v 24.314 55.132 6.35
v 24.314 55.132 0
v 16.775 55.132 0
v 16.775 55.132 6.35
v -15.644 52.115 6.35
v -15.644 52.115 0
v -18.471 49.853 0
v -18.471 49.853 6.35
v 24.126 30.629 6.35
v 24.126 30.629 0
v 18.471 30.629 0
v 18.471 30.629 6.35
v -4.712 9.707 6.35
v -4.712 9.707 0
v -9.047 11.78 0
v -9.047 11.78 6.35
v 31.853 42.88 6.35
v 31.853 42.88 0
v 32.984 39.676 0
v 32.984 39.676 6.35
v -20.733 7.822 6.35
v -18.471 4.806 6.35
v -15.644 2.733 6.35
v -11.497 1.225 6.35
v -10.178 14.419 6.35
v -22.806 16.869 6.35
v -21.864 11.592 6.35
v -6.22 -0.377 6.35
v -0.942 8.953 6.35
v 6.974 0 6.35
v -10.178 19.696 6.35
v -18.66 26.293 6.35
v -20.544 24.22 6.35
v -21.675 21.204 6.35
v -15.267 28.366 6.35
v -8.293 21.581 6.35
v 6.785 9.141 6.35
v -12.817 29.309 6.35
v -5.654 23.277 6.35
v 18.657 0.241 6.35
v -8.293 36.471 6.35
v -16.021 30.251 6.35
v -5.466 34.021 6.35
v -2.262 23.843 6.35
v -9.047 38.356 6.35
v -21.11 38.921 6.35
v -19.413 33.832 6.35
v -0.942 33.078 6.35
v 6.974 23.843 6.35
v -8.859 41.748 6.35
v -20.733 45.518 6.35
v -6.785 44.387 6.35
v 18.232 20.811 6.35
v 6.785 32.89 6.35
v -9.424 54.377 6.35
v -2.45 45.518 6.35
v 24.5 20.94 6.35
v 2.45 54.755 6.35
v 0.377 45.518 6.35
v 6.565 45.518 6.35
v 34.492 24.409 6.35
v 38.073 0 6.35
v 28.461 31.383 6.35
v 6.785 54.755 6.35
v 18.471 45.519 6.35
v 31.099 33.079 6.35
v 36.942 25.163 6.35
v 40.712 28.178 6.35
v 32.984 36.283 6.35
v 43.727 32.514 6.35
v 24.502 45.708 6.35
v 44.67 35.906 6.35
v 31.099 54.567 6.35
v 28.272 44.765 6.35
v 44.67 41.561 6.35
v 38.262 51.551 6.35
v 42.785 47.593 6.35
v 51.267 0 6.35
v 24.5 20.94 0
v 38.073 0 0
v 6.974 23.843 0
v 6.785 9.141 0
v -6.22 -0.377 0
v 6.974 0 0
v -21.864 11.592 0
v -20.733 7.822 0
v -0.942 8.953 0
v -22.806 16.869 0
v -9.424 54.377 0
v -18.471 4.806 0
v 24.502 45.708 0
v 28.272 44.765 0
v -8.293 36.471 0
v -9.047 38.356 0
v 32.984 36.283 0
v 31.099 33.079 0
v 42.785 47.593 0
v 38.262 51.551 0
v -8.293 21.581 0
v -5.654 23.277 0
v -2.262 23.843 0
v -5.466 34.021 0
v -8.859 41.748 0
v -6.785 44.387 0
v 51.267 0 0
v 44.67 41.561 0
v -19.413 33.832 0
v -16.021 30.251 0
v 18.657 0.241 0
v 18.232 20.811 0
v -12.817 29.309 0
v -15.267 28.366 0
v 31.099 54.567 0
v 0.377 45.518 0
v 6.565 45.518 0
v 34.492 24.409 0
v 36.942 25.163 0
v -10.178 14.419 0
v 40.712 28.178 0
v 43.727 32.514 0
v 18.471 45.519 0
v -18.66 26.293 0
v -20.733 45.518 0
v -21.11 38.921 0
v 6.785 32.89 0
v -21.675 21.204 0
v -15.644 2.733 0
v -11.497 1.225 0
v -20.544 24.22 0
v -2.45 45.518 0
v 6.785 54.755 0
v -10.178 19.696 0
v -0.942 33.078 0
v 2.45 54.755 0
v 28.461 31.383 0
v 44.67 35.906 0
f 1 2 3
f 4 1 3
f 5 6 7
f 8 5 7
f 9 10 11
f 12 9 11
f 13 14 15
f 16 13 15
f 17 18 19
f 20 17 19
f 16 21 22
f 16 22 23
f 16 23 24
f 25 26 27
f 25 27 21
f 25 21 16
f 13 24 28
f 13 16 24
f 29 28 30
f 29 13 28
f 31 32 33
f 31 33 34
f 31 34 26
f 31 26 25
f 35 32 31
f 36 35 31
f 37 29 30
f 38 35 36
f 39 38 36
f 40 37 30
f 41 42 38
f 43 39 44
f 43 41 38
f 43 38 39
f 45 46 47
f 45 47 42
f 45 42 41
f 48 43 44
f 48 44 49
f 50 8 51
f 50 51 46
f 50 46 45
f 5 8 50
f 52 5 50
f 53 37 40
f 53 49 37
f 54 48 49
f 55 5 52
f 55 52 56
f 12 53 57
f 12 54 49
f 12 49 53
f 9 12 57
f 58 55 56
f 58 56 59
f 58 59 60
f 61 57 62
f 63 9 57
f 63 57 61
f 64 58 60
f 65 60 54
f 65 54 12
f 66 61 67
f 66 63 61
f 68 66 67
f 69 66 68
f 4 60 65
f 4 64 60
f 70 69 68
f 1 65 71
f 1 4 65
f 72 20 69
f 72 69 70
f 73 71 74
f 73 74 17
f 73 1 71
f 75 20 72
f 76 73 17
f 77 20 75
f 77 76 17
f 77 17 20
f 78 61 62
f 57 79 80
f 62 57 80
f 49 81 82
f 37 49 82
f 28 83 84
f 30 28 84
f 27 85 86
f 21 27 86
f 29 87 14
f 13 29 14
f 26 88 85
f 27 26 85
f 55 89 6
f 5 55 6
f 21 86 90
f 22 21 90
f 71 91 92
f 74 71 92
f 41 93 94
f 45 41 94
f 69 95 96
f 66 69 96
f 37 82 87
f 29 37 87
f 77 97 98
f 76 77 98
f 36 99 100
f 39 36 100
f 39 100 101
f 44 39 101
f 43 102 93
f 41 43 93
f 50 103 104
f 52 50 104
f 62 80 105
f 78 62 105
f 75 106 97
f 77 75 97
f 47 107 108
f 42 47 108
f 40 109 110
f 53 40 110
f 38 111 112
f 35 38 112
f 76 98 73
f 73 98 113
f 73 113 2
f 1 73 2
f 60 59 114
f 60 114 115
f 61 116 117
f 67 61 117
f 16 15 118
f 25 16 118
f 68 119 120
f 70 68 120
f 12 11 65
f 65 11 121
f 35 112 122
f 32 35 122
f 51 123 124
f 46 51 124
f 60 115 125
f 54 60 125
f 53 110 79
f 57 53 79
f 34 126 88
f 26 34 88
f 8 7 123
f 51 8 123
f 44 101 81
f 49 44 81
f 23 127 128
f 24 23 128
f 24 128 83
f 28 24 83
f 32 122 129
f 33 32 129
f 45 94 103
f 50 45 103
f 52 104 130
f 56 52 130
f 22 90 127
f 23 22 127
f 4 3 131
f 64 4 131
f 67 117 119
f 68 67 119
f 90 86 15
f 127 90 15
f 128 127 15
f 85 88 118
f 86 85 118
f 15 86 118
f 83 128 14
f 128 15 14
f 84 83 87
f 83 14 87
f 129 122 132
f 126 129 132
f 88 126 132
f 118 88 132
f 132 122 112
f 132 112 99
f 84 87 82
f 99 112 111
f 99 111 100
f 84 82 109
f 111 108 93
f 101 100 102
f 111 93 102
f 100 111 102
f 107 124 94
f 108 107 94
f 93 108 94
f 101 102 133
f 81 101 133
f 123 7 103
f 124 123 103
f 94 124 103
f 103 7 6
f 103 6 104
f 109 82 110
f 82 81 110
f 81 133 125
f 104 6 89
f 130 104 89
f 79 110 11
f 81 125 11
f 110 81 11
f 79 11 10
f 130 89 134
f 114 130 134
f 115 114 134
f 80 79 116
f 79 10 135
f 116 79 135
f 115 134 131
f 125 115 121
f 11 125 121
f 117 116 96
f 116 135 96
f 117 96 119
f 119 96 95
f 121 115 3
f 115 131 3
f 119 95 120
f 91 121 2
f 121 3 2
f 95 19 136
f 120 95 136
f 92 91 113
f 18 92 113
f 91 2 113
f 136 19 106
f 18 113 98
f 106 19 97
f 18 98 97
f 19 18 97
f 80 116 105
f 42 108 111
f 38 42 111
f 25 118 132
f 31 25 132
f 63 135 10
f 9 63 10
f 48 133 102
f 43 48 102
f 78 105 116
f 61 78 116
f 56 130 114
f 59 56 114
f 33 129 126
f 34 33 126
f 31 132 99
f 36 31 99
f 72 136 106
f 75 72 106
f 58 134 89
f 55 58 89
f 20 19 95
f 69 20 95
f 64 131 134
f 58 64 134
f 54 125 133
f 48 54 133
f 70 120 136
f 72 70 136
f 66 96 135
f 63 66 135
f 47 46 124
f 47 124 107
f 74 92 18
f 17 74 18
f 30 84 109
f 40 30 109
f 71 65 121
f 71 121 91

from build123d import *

# Parameters (mm, degrees)
F1_DEPTH = 6.35
F2_DEPTH = 6.35


with BuildPart() as f1:
    # F0 (on Top) → F1 (new body)
    with BuildSketch(Plane.XY):
        Polygon((6.785307, 32.889859), (6.973788, 23.842792), (6.785307, 9.141308), (6.973781, 0), (18.656539, 0.240873), (18.232433, 20.810728), (24.50015, 20.939954), (38.073074, 0), (51.266711, 0), (34.491945, 24.408581), (36.942191, 25.162537), (40.711805, 28.178345), (43.727491, 32.513574), (44.669896, 35.906363), (44.669896, 41.561004), (42.785086, 47.592629), (38.261559, 51.55088), (31.099292, 54.566693), (24.313992, 55.132158), (16.774772, 55.132158), (6.7853, 54.755177), (6.565141, 45.518056), align=None)
        Polygon((18.471096, 30.628692), (18.471096, 45.519255), (24.502473, 45.707747), (28.272083, 44.765305), (31.853214, 42.880423), (32.9841, 39.676126), (32.9841, 36.283337), (31.099292, 33.079039), (28.460566, 31.382646), (24.125513, 30.628692), align=None, mode=Mode.SUBTRACT)
    extrude(amount=F1_DEPTH)

    # F0 (on Top) → F2 (join)
    with BuildSketch(Plane.XY):
        Polygon((-10.177946, 19.69622), (-8.293139, 21.581025), (-5.654412, 23.277351), (-2.261762, 23.842792), (6.973788, 23.842792), (6.785307, 32.889859), (-0.942398, 33.07834), (-5.46593, 34.020742), (-8.293139, 36.470992), (-9.047061, 38.355795), (-8.858582, 41.748447), (-6.785294, 44.387174), (-2.450243, 45.518057), (0.376968, 45.518057), (6.565141, 45.518056), (6.7853, 54.755177), (2.450247, 54.755177), (-9.424023, 54.376644), (-15.643883, 52.114875), (-18.471091, 49.85311), (-20.732858, 45.518057), (-21.109819, 38.921238), (-19.413493, 33.832264), (-16.020843, 30.251132), (-12.816672, 29.308728), (-15.266922, 28.366325), (-18.659571, 26.293041), (-20.544375, 24.219753), (-21.67526, 21.204065), (-22.806143, 16.86901), (-21.863741, 11.591555), (-20.732858, 7.821944), (-18.471091, 4.806255), (-15.643883, 2.732969), (-11.49731, 1.225124), (-6.219853, -0.376961), (6.973781, 0), (6.785307, 9.141308), (-0.942398, 8.952827), (-4.71201, 9.70675), (-9.047061, 11.780035), (-10.177946, 14.418763), (-10.177946, 17.057493), align=None)
    extrude(amount=F2_DEPTH)


solid = f1.part
